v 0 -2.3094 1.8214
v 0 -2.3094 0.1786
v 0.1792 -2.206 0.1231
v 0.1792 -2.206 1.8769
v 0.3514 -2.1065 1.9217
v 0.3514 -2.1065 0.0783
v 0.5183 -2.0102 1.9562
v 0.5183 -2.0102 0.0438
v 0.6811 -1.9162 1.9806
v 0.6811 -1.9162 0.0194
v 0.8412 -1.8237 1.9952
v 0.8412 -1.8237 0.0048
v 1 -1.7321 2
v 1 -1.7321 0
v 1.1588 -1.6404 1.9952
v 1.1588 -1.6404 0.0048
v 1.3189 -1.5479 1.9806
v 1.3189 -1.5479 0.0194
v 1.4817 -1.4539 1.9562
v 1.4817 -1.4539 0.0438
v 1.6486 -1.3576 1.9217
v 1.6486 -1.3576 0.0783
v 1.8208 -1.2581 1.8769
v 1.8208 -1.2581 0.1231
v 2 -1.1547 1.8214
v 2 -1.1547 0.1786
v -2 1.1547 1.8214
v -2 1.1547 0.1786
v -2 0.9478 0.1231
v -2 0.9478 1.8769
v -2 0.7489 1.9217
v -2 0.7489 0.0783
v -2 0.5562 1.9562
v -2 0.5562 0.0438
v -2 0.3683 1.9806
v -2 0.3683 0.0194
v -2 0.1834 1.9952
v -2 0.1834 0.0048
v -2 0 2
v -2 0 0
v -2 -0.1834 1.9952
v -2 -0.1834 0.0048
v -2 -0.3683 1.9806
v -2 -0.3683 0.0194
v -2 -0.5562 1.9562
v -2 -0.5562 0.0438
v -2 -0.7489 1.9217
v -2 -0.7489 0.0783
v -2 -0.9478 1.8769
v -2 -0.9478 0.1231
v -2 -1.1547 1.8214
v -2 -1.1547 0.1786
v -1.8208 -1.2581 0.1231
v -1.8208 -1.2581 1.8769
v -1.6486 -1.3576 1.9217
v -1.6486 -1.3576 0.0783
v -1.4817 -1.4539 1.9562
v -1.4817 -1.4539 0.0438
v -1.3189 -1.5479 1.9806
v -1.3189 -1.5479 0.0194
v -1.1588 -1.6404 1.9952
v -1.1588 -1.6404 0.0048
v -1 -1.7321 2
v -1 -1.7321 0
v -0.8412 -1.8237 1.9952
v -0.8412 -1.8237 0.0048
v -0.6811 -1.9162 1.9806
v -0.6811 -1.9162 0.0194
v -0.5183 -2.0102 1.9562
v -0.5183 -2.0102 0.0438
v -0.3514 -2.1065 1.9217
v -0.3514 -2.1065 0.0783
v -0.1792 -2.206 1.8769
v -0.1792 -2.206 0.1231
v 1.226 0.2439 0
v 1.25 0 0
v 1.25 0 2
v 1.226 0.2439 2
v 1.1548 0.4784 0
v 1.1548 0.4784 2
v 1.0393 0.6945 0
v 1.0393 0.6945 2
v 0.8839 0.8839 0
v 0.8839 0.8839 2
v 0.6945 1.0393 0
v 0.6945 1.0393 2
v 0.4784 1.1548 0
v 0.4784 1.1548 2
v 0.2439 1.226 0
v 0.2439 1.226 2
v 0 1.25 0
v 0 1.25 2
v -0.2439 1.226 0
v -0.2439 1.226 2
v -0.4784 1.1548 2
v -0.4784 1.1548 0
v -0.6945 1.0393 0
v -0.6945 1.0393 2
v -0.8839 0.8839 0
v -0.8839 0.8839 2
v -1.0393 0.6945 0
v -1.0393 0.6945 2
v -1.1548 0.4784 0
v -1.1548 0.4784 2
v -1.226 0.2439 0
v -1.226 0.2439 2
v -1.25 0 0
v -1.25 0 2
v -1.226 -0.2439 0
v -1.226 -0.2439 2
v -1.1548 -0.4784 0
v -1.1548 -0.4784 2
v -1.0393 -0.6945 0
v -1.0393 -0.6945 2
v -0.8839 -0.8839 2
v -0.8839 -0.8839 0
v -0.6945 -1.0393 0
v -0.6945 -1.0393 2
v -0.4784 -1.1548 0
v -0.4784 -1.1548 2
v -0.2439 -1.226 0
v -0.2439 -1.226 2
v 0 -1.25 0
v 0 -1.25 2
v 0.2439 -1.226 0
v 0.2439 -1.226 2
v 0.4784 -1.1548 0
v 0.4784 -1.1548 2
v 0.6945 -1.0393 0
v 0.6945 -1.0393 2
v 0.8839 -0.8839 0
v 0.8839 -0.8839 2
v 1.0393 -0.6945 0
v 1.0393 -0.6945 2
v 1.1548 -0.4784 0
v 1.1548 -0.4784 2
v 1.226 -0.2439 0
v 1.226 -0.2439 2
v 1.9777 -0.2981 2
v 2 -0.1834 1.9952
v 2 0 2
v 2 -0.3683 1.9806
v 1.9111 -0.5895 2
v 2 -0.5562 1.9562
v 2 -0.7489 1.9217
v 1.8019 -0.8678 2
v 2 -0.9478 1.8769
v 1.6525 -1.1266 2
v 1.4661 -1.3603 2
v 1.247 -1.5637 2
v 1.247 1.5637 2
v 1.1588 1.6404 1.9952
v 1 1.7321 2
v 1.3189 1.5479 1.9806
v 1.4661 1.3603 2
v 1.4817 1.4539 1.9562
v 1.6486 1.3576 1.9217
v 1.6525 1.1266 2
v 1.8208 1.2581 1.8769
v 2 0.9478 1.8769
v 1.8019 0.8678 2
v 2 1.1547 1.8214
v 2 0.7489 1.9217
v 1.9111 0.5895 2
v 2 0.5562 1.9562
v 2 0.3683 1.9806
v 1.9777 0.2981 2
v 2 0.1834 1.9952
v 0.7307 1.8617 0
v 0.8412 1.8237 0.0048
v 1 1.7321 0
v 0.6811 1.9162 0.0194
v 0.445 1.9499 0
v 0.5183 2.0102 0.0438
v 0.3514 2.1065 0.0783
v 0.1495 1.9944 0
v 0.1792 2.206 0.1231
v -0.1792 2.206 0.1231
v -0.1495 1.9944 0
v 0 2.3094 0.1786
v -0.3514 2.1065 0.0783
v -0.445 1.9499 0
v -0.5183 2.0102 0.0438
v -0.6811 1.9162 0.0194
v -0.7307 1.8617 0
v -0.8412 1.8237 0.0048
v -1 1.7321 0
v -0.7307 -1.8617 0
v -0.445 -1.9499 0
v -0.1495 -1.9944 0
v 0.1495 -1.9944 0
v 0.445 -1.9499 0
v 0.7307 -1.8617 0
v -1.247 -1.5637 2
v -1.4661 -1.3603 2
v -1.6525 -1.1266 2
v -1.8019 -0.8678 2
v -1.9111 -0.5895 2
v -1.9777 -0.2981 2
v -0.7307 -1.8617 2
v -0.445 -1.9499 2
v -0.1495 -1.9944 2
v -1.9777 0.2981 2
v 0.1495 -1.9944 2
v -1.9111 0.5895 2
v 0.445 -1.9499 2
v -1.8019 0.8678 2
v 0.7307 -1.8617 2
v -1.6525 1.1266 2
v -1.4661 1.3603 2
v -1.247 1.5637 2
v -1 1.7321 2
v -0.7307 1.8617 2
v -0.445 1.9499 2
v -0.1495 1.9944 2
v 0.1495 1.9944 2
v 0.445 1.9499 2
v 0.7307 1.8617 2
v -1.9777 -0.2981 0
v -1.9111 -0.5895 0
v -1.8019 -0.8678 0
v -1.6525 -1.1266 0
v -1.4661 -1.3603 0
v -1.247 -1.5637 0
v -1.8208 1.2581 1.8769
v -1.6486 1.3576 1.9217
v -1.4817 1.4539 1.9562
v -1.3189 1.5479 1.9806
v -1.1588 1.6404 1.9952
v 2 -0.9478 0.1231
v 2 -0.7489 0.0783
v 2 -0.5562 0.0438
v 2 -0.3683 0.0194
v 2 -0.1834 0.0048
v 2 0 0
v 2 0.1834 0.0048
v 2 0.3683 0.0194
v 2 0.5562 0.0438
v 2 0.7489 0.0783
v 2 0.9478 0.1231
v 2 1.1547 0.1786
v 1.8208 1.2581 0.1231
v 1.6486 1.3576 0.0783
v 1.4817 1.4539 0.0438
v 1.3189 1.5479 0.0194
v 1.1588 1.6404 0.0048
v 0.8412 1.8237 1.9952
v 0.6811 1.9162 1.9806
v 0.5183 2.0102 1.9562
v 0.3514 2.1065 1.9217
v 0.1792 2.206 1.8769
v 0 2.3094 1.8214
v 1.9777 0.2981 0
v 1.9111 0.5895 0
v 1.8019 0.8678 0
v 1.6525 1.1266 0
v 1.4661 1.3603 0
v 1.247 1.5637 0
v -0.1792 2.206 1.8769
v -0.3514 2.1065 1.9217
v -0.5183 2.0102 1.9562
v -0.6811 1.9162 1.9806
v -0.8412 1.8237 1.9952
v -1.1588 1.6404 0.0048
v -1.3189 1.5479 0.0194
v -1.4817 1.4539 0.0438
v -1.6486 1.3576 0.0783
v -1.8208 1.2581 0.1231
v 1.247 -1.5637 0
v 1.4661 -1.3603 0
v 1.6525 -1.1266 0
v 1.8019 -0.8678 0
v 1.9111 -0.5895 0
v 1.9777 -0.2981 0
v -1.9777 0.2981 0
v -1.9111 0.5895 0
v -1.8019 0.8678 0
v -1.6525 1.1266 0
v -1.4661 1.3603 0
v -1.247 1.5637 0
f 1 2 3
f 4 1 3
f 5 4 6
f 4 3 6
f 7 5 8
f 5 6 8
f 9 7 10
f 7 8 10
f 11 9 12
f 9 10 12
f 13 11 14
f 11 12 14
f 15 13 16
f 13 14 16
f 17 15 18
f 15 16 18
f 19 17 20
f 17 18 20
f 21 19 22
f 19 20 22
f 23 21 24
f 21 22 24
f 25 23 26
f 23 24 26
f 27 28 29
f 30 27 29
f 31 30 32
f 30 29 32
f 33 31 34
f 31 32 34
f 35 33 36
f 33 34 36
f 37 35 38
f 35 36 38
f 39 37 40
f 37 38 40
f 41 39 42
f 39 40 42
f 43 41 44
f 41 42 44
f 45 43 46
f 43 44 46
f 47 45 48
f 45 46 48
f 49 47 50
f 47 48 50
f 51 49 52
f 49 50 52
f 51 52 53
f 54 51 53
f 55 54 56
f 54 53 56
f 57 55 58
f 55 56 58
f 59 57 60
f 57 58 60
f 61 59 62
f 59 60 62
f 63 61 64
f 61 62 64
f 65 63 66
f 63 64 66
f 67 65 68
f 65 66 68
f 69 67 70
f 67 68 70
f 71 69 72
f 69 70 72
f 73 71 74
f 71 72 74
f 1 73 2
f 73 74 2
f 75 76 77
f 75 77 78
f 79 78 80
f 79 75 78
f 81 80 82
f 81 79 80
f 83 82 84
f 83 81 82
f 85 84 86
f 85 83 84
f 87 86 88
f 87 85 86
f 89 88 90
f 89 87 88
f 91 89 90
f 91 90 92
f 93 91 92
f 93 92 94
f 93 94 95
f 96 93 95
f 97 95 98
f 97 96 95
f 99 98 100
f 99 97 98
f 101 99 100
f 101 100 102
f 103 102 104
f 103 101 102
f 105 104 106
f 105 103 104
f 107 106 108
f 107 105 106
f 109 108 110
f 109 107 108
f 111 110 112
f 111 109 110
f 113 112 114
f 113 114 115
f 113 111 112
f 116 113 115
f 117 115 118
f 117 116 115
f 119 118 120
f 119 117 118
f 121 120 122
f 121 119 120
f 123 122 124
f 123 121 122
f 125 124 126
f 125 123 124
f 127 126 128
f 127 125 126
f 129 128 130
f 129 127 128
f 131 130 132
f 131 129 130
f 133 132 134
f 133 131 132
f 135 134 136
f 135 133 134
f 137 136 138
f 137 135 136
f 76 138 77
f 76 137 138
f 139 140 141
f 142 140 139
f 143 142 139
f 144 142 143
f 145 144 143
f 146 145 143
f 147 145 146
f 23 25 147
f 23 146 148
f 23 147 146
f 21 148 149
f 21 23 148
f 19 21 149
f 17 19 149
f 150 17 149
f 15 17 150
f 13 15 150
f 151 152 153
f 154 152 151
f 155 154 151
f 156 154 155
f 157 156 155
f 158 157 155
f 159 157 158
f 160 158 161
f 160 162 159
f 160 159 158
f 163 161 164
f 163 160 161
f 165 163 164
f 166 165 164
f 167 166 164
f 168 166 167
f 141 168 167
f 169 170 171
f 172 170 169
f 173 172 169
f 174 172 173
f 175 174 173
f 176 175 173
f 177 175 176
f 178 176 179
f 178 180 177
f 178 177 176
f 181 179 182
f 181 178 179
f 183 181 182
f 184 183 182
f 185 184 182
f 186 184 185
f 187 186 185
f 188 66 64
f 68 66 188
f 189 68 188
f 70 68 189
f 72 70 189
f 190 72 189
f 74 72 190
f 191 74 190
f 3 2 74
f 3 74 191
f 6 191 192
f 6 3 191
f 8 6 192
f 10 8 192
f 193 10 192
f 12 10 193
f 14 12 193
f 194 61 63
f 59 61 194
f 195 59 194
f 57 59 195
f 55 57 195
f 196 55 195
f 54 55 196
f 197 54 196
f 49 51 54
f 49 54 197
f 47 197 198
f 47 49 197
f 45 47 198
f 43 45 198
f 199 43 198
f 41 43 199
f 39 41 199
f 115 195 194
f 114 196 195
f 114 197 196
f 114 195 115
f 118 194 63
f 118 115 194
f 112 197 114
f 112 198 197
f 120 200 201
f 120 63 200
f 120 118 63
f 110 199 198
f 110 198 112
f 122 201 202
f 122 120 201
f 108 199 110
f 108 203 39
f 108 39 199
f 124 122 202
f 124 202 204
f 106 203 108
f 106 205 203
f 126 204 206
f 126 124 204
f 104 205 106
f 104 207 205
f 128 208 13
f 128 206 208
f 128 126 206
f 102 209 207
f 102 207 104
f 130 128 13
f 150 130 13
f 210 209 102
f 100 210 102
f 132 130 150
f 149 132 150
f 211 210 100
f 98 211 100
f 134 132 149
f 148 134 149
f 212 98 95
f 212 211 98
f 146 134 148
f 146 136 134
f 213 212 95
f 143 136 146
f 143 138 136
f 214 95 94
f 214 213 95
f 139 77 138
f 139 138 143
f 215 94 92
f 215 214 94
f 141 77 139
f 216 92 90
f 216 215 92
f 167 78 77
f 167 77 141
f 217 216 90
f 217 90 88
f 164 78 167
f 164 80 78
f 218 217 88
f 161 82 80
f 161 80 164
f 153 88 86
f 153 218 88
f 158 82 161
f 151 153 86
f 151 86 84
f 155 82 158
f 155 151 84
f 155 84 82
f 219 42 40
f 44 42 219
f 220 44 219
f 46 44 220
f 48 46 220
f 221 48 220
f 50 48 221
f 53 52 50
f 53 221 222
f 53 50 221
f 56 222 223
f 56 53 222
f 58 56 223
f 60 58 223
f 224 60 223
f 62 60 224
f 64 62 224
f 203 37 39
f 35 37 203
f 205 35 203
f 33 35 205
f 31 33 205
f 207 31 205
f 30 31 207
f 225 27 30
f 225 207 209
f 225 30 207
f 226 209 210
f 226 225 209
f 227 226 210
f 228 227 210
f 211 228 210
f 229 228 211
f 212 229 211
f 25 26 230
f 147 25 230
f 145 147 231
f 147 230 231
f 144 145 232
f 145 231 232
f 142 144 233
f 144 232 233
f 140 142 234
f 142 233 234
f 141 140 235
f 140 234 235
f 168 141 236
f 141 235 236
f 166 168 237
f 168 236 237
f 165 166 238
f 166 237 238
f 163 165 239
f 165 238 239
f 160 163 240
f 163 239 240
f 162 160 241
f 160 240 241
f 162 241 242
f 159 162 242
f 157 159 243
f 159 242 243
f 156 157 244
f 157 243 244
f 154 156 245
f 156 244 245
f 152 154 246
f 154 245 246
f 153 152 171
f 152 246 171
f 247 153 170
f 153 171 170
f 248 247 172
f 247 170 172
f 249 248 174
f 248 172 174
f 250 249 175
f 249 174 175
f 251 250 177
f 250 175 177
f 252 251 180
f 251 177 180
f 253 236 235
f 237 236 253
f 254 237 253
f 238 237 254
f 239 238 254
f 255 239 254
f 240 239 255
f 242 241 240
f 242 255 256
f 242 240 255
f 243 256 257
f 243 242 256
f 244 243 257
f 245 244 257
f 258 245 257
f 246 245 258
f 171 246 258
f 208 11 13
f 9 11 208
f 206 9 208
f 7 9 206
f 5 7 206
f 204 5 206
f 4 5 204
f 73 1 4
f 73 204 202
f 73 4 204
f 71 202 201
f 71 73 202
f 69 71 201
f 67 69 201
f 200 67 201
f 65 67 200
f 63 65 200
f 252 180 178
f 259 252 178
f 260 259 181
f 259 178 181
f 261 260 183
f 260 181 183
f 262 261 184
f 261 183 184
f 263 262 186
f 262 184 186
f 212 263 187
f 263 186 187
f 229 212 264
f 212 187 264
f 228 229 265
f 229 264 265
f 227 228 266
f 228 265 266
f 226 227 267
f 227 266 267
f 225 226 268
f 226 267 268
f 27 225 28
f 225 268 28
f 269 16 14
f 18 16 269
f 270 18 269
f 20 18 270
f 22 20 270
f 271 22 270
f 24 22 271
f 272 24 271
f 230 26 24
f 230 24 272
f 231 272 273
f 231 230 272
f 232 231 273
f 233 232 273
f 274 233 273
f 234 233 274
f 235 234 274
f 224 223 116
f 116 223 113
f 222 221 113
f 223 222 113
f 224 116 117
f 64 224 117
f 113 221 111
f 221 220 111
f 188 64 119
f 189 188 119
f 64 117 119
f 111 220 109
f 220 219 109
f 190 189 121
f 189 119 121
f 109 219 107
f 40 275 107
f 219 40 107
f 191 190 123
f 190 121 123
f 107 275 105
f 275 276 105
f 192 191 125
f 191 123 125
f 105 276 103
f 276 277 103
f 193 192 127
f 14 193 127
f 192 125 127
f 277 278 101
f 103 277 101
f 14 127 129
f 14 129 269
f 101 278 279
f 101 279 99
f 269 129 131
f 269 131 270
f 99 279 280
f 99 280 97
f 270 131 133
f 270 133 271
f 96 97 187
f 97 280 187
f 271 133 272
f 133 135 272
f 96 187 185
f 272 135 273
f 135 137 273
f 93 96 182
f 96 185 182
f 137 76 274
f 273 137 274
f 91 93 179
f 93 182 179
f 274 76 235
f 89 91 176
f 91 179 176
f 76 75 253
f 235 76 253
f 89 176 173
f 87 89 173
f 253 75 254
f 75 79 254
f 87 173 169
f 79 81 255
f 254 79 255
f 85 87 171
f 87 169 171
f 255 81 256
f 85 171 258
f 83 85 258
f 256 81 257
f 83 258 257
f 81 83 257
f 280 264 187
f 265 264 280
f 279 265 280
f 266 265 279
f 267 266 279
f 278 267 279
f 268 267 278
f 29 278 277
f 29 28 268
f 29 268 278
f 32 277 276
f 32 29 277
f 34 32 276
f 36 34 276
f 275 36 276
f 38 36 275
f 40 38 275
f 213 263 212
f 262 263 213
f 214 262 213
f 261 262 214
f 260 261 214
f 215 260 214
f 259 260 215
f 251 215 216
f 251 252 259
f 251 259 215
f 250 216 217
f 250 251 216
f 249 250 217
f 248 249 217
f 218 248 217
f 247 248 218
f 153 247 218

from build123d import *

# Parameters (mm, degrees)
SKETCH1_R           = 1.25
BOSS_EXTRUDE1_DEPTH = 2
SKETCH2_OUTSIDE_W   = 14.214
SKETCH2_OUTSIDE_H   = 14.832
SKETCH2_OUTSIDE_R   = 2
CUT_EXTRUDE1_DEPTH  = 2
CUT_EXTRUDE1_TAPER  = 60
SKETCH3_OUTSIDE_W   = 14.214
SKETCH3_OUTSIDE_H   = 14.832
SKETCH3_OUTSIDE_R   = 2
CUT_EXTRUDE2_DEPTH  = 2
CUT_EXTRUDE2_TAPER  = 60


with BuildPart() as part:
    # Sketch1 → Boss-Extrude1 (new body)
    with BuildSketch(Plane.XY):
        Polygon((0, -2.309401077), (2, -1.154700538), (2, 1.154700538), (0, 2.309401077), (-2, 1.154700538), (-2, -1.154700538), align=None)
        Circle(SKETCH1_R, mode=Mode.SUBTRACT)
    extrude(amount=BOSS_EXTRUDE1_DEPTH)

    # Sketch2 outside → Cut-Extrude1 (cut)
    with BuildSketch(Plane.XY.offset(2)):
        Rectangle(SKETCH2_OUTSIDE_W, SKETCH2_OUTSIDE_H)
        Circle(SKETCH2_OUTSIDE_R, mode=Mode.SUBTRACT)
    extrude(amount=-CUT_EXTRUDE1_DEPTH, taper=CUT_EXTRUDE1_TAPER, mode=Mode.SUBTRACT)

    # Sketch3 outside → Cut-Extrude2 (cut)
    with BuildSketch(Plane(origin=(0, 0, 0), x_dir=(-1, 0, 0), z_dir=(0, 0, -1))):
        Rectangle(SKETCH3_OUTSIDE_W, SKETCH3_OUTSIDE_H)
        Circle(SKETCH3_OUTSIDE_R, mode=Mode.SUBTRACT)
    extrude(amount=-CUT_EXTRUDE2_DEPTH, taper=CUT_EXTRUDE2_TAPER, mode=Mode.SUBTRACT)


solid = part.part
